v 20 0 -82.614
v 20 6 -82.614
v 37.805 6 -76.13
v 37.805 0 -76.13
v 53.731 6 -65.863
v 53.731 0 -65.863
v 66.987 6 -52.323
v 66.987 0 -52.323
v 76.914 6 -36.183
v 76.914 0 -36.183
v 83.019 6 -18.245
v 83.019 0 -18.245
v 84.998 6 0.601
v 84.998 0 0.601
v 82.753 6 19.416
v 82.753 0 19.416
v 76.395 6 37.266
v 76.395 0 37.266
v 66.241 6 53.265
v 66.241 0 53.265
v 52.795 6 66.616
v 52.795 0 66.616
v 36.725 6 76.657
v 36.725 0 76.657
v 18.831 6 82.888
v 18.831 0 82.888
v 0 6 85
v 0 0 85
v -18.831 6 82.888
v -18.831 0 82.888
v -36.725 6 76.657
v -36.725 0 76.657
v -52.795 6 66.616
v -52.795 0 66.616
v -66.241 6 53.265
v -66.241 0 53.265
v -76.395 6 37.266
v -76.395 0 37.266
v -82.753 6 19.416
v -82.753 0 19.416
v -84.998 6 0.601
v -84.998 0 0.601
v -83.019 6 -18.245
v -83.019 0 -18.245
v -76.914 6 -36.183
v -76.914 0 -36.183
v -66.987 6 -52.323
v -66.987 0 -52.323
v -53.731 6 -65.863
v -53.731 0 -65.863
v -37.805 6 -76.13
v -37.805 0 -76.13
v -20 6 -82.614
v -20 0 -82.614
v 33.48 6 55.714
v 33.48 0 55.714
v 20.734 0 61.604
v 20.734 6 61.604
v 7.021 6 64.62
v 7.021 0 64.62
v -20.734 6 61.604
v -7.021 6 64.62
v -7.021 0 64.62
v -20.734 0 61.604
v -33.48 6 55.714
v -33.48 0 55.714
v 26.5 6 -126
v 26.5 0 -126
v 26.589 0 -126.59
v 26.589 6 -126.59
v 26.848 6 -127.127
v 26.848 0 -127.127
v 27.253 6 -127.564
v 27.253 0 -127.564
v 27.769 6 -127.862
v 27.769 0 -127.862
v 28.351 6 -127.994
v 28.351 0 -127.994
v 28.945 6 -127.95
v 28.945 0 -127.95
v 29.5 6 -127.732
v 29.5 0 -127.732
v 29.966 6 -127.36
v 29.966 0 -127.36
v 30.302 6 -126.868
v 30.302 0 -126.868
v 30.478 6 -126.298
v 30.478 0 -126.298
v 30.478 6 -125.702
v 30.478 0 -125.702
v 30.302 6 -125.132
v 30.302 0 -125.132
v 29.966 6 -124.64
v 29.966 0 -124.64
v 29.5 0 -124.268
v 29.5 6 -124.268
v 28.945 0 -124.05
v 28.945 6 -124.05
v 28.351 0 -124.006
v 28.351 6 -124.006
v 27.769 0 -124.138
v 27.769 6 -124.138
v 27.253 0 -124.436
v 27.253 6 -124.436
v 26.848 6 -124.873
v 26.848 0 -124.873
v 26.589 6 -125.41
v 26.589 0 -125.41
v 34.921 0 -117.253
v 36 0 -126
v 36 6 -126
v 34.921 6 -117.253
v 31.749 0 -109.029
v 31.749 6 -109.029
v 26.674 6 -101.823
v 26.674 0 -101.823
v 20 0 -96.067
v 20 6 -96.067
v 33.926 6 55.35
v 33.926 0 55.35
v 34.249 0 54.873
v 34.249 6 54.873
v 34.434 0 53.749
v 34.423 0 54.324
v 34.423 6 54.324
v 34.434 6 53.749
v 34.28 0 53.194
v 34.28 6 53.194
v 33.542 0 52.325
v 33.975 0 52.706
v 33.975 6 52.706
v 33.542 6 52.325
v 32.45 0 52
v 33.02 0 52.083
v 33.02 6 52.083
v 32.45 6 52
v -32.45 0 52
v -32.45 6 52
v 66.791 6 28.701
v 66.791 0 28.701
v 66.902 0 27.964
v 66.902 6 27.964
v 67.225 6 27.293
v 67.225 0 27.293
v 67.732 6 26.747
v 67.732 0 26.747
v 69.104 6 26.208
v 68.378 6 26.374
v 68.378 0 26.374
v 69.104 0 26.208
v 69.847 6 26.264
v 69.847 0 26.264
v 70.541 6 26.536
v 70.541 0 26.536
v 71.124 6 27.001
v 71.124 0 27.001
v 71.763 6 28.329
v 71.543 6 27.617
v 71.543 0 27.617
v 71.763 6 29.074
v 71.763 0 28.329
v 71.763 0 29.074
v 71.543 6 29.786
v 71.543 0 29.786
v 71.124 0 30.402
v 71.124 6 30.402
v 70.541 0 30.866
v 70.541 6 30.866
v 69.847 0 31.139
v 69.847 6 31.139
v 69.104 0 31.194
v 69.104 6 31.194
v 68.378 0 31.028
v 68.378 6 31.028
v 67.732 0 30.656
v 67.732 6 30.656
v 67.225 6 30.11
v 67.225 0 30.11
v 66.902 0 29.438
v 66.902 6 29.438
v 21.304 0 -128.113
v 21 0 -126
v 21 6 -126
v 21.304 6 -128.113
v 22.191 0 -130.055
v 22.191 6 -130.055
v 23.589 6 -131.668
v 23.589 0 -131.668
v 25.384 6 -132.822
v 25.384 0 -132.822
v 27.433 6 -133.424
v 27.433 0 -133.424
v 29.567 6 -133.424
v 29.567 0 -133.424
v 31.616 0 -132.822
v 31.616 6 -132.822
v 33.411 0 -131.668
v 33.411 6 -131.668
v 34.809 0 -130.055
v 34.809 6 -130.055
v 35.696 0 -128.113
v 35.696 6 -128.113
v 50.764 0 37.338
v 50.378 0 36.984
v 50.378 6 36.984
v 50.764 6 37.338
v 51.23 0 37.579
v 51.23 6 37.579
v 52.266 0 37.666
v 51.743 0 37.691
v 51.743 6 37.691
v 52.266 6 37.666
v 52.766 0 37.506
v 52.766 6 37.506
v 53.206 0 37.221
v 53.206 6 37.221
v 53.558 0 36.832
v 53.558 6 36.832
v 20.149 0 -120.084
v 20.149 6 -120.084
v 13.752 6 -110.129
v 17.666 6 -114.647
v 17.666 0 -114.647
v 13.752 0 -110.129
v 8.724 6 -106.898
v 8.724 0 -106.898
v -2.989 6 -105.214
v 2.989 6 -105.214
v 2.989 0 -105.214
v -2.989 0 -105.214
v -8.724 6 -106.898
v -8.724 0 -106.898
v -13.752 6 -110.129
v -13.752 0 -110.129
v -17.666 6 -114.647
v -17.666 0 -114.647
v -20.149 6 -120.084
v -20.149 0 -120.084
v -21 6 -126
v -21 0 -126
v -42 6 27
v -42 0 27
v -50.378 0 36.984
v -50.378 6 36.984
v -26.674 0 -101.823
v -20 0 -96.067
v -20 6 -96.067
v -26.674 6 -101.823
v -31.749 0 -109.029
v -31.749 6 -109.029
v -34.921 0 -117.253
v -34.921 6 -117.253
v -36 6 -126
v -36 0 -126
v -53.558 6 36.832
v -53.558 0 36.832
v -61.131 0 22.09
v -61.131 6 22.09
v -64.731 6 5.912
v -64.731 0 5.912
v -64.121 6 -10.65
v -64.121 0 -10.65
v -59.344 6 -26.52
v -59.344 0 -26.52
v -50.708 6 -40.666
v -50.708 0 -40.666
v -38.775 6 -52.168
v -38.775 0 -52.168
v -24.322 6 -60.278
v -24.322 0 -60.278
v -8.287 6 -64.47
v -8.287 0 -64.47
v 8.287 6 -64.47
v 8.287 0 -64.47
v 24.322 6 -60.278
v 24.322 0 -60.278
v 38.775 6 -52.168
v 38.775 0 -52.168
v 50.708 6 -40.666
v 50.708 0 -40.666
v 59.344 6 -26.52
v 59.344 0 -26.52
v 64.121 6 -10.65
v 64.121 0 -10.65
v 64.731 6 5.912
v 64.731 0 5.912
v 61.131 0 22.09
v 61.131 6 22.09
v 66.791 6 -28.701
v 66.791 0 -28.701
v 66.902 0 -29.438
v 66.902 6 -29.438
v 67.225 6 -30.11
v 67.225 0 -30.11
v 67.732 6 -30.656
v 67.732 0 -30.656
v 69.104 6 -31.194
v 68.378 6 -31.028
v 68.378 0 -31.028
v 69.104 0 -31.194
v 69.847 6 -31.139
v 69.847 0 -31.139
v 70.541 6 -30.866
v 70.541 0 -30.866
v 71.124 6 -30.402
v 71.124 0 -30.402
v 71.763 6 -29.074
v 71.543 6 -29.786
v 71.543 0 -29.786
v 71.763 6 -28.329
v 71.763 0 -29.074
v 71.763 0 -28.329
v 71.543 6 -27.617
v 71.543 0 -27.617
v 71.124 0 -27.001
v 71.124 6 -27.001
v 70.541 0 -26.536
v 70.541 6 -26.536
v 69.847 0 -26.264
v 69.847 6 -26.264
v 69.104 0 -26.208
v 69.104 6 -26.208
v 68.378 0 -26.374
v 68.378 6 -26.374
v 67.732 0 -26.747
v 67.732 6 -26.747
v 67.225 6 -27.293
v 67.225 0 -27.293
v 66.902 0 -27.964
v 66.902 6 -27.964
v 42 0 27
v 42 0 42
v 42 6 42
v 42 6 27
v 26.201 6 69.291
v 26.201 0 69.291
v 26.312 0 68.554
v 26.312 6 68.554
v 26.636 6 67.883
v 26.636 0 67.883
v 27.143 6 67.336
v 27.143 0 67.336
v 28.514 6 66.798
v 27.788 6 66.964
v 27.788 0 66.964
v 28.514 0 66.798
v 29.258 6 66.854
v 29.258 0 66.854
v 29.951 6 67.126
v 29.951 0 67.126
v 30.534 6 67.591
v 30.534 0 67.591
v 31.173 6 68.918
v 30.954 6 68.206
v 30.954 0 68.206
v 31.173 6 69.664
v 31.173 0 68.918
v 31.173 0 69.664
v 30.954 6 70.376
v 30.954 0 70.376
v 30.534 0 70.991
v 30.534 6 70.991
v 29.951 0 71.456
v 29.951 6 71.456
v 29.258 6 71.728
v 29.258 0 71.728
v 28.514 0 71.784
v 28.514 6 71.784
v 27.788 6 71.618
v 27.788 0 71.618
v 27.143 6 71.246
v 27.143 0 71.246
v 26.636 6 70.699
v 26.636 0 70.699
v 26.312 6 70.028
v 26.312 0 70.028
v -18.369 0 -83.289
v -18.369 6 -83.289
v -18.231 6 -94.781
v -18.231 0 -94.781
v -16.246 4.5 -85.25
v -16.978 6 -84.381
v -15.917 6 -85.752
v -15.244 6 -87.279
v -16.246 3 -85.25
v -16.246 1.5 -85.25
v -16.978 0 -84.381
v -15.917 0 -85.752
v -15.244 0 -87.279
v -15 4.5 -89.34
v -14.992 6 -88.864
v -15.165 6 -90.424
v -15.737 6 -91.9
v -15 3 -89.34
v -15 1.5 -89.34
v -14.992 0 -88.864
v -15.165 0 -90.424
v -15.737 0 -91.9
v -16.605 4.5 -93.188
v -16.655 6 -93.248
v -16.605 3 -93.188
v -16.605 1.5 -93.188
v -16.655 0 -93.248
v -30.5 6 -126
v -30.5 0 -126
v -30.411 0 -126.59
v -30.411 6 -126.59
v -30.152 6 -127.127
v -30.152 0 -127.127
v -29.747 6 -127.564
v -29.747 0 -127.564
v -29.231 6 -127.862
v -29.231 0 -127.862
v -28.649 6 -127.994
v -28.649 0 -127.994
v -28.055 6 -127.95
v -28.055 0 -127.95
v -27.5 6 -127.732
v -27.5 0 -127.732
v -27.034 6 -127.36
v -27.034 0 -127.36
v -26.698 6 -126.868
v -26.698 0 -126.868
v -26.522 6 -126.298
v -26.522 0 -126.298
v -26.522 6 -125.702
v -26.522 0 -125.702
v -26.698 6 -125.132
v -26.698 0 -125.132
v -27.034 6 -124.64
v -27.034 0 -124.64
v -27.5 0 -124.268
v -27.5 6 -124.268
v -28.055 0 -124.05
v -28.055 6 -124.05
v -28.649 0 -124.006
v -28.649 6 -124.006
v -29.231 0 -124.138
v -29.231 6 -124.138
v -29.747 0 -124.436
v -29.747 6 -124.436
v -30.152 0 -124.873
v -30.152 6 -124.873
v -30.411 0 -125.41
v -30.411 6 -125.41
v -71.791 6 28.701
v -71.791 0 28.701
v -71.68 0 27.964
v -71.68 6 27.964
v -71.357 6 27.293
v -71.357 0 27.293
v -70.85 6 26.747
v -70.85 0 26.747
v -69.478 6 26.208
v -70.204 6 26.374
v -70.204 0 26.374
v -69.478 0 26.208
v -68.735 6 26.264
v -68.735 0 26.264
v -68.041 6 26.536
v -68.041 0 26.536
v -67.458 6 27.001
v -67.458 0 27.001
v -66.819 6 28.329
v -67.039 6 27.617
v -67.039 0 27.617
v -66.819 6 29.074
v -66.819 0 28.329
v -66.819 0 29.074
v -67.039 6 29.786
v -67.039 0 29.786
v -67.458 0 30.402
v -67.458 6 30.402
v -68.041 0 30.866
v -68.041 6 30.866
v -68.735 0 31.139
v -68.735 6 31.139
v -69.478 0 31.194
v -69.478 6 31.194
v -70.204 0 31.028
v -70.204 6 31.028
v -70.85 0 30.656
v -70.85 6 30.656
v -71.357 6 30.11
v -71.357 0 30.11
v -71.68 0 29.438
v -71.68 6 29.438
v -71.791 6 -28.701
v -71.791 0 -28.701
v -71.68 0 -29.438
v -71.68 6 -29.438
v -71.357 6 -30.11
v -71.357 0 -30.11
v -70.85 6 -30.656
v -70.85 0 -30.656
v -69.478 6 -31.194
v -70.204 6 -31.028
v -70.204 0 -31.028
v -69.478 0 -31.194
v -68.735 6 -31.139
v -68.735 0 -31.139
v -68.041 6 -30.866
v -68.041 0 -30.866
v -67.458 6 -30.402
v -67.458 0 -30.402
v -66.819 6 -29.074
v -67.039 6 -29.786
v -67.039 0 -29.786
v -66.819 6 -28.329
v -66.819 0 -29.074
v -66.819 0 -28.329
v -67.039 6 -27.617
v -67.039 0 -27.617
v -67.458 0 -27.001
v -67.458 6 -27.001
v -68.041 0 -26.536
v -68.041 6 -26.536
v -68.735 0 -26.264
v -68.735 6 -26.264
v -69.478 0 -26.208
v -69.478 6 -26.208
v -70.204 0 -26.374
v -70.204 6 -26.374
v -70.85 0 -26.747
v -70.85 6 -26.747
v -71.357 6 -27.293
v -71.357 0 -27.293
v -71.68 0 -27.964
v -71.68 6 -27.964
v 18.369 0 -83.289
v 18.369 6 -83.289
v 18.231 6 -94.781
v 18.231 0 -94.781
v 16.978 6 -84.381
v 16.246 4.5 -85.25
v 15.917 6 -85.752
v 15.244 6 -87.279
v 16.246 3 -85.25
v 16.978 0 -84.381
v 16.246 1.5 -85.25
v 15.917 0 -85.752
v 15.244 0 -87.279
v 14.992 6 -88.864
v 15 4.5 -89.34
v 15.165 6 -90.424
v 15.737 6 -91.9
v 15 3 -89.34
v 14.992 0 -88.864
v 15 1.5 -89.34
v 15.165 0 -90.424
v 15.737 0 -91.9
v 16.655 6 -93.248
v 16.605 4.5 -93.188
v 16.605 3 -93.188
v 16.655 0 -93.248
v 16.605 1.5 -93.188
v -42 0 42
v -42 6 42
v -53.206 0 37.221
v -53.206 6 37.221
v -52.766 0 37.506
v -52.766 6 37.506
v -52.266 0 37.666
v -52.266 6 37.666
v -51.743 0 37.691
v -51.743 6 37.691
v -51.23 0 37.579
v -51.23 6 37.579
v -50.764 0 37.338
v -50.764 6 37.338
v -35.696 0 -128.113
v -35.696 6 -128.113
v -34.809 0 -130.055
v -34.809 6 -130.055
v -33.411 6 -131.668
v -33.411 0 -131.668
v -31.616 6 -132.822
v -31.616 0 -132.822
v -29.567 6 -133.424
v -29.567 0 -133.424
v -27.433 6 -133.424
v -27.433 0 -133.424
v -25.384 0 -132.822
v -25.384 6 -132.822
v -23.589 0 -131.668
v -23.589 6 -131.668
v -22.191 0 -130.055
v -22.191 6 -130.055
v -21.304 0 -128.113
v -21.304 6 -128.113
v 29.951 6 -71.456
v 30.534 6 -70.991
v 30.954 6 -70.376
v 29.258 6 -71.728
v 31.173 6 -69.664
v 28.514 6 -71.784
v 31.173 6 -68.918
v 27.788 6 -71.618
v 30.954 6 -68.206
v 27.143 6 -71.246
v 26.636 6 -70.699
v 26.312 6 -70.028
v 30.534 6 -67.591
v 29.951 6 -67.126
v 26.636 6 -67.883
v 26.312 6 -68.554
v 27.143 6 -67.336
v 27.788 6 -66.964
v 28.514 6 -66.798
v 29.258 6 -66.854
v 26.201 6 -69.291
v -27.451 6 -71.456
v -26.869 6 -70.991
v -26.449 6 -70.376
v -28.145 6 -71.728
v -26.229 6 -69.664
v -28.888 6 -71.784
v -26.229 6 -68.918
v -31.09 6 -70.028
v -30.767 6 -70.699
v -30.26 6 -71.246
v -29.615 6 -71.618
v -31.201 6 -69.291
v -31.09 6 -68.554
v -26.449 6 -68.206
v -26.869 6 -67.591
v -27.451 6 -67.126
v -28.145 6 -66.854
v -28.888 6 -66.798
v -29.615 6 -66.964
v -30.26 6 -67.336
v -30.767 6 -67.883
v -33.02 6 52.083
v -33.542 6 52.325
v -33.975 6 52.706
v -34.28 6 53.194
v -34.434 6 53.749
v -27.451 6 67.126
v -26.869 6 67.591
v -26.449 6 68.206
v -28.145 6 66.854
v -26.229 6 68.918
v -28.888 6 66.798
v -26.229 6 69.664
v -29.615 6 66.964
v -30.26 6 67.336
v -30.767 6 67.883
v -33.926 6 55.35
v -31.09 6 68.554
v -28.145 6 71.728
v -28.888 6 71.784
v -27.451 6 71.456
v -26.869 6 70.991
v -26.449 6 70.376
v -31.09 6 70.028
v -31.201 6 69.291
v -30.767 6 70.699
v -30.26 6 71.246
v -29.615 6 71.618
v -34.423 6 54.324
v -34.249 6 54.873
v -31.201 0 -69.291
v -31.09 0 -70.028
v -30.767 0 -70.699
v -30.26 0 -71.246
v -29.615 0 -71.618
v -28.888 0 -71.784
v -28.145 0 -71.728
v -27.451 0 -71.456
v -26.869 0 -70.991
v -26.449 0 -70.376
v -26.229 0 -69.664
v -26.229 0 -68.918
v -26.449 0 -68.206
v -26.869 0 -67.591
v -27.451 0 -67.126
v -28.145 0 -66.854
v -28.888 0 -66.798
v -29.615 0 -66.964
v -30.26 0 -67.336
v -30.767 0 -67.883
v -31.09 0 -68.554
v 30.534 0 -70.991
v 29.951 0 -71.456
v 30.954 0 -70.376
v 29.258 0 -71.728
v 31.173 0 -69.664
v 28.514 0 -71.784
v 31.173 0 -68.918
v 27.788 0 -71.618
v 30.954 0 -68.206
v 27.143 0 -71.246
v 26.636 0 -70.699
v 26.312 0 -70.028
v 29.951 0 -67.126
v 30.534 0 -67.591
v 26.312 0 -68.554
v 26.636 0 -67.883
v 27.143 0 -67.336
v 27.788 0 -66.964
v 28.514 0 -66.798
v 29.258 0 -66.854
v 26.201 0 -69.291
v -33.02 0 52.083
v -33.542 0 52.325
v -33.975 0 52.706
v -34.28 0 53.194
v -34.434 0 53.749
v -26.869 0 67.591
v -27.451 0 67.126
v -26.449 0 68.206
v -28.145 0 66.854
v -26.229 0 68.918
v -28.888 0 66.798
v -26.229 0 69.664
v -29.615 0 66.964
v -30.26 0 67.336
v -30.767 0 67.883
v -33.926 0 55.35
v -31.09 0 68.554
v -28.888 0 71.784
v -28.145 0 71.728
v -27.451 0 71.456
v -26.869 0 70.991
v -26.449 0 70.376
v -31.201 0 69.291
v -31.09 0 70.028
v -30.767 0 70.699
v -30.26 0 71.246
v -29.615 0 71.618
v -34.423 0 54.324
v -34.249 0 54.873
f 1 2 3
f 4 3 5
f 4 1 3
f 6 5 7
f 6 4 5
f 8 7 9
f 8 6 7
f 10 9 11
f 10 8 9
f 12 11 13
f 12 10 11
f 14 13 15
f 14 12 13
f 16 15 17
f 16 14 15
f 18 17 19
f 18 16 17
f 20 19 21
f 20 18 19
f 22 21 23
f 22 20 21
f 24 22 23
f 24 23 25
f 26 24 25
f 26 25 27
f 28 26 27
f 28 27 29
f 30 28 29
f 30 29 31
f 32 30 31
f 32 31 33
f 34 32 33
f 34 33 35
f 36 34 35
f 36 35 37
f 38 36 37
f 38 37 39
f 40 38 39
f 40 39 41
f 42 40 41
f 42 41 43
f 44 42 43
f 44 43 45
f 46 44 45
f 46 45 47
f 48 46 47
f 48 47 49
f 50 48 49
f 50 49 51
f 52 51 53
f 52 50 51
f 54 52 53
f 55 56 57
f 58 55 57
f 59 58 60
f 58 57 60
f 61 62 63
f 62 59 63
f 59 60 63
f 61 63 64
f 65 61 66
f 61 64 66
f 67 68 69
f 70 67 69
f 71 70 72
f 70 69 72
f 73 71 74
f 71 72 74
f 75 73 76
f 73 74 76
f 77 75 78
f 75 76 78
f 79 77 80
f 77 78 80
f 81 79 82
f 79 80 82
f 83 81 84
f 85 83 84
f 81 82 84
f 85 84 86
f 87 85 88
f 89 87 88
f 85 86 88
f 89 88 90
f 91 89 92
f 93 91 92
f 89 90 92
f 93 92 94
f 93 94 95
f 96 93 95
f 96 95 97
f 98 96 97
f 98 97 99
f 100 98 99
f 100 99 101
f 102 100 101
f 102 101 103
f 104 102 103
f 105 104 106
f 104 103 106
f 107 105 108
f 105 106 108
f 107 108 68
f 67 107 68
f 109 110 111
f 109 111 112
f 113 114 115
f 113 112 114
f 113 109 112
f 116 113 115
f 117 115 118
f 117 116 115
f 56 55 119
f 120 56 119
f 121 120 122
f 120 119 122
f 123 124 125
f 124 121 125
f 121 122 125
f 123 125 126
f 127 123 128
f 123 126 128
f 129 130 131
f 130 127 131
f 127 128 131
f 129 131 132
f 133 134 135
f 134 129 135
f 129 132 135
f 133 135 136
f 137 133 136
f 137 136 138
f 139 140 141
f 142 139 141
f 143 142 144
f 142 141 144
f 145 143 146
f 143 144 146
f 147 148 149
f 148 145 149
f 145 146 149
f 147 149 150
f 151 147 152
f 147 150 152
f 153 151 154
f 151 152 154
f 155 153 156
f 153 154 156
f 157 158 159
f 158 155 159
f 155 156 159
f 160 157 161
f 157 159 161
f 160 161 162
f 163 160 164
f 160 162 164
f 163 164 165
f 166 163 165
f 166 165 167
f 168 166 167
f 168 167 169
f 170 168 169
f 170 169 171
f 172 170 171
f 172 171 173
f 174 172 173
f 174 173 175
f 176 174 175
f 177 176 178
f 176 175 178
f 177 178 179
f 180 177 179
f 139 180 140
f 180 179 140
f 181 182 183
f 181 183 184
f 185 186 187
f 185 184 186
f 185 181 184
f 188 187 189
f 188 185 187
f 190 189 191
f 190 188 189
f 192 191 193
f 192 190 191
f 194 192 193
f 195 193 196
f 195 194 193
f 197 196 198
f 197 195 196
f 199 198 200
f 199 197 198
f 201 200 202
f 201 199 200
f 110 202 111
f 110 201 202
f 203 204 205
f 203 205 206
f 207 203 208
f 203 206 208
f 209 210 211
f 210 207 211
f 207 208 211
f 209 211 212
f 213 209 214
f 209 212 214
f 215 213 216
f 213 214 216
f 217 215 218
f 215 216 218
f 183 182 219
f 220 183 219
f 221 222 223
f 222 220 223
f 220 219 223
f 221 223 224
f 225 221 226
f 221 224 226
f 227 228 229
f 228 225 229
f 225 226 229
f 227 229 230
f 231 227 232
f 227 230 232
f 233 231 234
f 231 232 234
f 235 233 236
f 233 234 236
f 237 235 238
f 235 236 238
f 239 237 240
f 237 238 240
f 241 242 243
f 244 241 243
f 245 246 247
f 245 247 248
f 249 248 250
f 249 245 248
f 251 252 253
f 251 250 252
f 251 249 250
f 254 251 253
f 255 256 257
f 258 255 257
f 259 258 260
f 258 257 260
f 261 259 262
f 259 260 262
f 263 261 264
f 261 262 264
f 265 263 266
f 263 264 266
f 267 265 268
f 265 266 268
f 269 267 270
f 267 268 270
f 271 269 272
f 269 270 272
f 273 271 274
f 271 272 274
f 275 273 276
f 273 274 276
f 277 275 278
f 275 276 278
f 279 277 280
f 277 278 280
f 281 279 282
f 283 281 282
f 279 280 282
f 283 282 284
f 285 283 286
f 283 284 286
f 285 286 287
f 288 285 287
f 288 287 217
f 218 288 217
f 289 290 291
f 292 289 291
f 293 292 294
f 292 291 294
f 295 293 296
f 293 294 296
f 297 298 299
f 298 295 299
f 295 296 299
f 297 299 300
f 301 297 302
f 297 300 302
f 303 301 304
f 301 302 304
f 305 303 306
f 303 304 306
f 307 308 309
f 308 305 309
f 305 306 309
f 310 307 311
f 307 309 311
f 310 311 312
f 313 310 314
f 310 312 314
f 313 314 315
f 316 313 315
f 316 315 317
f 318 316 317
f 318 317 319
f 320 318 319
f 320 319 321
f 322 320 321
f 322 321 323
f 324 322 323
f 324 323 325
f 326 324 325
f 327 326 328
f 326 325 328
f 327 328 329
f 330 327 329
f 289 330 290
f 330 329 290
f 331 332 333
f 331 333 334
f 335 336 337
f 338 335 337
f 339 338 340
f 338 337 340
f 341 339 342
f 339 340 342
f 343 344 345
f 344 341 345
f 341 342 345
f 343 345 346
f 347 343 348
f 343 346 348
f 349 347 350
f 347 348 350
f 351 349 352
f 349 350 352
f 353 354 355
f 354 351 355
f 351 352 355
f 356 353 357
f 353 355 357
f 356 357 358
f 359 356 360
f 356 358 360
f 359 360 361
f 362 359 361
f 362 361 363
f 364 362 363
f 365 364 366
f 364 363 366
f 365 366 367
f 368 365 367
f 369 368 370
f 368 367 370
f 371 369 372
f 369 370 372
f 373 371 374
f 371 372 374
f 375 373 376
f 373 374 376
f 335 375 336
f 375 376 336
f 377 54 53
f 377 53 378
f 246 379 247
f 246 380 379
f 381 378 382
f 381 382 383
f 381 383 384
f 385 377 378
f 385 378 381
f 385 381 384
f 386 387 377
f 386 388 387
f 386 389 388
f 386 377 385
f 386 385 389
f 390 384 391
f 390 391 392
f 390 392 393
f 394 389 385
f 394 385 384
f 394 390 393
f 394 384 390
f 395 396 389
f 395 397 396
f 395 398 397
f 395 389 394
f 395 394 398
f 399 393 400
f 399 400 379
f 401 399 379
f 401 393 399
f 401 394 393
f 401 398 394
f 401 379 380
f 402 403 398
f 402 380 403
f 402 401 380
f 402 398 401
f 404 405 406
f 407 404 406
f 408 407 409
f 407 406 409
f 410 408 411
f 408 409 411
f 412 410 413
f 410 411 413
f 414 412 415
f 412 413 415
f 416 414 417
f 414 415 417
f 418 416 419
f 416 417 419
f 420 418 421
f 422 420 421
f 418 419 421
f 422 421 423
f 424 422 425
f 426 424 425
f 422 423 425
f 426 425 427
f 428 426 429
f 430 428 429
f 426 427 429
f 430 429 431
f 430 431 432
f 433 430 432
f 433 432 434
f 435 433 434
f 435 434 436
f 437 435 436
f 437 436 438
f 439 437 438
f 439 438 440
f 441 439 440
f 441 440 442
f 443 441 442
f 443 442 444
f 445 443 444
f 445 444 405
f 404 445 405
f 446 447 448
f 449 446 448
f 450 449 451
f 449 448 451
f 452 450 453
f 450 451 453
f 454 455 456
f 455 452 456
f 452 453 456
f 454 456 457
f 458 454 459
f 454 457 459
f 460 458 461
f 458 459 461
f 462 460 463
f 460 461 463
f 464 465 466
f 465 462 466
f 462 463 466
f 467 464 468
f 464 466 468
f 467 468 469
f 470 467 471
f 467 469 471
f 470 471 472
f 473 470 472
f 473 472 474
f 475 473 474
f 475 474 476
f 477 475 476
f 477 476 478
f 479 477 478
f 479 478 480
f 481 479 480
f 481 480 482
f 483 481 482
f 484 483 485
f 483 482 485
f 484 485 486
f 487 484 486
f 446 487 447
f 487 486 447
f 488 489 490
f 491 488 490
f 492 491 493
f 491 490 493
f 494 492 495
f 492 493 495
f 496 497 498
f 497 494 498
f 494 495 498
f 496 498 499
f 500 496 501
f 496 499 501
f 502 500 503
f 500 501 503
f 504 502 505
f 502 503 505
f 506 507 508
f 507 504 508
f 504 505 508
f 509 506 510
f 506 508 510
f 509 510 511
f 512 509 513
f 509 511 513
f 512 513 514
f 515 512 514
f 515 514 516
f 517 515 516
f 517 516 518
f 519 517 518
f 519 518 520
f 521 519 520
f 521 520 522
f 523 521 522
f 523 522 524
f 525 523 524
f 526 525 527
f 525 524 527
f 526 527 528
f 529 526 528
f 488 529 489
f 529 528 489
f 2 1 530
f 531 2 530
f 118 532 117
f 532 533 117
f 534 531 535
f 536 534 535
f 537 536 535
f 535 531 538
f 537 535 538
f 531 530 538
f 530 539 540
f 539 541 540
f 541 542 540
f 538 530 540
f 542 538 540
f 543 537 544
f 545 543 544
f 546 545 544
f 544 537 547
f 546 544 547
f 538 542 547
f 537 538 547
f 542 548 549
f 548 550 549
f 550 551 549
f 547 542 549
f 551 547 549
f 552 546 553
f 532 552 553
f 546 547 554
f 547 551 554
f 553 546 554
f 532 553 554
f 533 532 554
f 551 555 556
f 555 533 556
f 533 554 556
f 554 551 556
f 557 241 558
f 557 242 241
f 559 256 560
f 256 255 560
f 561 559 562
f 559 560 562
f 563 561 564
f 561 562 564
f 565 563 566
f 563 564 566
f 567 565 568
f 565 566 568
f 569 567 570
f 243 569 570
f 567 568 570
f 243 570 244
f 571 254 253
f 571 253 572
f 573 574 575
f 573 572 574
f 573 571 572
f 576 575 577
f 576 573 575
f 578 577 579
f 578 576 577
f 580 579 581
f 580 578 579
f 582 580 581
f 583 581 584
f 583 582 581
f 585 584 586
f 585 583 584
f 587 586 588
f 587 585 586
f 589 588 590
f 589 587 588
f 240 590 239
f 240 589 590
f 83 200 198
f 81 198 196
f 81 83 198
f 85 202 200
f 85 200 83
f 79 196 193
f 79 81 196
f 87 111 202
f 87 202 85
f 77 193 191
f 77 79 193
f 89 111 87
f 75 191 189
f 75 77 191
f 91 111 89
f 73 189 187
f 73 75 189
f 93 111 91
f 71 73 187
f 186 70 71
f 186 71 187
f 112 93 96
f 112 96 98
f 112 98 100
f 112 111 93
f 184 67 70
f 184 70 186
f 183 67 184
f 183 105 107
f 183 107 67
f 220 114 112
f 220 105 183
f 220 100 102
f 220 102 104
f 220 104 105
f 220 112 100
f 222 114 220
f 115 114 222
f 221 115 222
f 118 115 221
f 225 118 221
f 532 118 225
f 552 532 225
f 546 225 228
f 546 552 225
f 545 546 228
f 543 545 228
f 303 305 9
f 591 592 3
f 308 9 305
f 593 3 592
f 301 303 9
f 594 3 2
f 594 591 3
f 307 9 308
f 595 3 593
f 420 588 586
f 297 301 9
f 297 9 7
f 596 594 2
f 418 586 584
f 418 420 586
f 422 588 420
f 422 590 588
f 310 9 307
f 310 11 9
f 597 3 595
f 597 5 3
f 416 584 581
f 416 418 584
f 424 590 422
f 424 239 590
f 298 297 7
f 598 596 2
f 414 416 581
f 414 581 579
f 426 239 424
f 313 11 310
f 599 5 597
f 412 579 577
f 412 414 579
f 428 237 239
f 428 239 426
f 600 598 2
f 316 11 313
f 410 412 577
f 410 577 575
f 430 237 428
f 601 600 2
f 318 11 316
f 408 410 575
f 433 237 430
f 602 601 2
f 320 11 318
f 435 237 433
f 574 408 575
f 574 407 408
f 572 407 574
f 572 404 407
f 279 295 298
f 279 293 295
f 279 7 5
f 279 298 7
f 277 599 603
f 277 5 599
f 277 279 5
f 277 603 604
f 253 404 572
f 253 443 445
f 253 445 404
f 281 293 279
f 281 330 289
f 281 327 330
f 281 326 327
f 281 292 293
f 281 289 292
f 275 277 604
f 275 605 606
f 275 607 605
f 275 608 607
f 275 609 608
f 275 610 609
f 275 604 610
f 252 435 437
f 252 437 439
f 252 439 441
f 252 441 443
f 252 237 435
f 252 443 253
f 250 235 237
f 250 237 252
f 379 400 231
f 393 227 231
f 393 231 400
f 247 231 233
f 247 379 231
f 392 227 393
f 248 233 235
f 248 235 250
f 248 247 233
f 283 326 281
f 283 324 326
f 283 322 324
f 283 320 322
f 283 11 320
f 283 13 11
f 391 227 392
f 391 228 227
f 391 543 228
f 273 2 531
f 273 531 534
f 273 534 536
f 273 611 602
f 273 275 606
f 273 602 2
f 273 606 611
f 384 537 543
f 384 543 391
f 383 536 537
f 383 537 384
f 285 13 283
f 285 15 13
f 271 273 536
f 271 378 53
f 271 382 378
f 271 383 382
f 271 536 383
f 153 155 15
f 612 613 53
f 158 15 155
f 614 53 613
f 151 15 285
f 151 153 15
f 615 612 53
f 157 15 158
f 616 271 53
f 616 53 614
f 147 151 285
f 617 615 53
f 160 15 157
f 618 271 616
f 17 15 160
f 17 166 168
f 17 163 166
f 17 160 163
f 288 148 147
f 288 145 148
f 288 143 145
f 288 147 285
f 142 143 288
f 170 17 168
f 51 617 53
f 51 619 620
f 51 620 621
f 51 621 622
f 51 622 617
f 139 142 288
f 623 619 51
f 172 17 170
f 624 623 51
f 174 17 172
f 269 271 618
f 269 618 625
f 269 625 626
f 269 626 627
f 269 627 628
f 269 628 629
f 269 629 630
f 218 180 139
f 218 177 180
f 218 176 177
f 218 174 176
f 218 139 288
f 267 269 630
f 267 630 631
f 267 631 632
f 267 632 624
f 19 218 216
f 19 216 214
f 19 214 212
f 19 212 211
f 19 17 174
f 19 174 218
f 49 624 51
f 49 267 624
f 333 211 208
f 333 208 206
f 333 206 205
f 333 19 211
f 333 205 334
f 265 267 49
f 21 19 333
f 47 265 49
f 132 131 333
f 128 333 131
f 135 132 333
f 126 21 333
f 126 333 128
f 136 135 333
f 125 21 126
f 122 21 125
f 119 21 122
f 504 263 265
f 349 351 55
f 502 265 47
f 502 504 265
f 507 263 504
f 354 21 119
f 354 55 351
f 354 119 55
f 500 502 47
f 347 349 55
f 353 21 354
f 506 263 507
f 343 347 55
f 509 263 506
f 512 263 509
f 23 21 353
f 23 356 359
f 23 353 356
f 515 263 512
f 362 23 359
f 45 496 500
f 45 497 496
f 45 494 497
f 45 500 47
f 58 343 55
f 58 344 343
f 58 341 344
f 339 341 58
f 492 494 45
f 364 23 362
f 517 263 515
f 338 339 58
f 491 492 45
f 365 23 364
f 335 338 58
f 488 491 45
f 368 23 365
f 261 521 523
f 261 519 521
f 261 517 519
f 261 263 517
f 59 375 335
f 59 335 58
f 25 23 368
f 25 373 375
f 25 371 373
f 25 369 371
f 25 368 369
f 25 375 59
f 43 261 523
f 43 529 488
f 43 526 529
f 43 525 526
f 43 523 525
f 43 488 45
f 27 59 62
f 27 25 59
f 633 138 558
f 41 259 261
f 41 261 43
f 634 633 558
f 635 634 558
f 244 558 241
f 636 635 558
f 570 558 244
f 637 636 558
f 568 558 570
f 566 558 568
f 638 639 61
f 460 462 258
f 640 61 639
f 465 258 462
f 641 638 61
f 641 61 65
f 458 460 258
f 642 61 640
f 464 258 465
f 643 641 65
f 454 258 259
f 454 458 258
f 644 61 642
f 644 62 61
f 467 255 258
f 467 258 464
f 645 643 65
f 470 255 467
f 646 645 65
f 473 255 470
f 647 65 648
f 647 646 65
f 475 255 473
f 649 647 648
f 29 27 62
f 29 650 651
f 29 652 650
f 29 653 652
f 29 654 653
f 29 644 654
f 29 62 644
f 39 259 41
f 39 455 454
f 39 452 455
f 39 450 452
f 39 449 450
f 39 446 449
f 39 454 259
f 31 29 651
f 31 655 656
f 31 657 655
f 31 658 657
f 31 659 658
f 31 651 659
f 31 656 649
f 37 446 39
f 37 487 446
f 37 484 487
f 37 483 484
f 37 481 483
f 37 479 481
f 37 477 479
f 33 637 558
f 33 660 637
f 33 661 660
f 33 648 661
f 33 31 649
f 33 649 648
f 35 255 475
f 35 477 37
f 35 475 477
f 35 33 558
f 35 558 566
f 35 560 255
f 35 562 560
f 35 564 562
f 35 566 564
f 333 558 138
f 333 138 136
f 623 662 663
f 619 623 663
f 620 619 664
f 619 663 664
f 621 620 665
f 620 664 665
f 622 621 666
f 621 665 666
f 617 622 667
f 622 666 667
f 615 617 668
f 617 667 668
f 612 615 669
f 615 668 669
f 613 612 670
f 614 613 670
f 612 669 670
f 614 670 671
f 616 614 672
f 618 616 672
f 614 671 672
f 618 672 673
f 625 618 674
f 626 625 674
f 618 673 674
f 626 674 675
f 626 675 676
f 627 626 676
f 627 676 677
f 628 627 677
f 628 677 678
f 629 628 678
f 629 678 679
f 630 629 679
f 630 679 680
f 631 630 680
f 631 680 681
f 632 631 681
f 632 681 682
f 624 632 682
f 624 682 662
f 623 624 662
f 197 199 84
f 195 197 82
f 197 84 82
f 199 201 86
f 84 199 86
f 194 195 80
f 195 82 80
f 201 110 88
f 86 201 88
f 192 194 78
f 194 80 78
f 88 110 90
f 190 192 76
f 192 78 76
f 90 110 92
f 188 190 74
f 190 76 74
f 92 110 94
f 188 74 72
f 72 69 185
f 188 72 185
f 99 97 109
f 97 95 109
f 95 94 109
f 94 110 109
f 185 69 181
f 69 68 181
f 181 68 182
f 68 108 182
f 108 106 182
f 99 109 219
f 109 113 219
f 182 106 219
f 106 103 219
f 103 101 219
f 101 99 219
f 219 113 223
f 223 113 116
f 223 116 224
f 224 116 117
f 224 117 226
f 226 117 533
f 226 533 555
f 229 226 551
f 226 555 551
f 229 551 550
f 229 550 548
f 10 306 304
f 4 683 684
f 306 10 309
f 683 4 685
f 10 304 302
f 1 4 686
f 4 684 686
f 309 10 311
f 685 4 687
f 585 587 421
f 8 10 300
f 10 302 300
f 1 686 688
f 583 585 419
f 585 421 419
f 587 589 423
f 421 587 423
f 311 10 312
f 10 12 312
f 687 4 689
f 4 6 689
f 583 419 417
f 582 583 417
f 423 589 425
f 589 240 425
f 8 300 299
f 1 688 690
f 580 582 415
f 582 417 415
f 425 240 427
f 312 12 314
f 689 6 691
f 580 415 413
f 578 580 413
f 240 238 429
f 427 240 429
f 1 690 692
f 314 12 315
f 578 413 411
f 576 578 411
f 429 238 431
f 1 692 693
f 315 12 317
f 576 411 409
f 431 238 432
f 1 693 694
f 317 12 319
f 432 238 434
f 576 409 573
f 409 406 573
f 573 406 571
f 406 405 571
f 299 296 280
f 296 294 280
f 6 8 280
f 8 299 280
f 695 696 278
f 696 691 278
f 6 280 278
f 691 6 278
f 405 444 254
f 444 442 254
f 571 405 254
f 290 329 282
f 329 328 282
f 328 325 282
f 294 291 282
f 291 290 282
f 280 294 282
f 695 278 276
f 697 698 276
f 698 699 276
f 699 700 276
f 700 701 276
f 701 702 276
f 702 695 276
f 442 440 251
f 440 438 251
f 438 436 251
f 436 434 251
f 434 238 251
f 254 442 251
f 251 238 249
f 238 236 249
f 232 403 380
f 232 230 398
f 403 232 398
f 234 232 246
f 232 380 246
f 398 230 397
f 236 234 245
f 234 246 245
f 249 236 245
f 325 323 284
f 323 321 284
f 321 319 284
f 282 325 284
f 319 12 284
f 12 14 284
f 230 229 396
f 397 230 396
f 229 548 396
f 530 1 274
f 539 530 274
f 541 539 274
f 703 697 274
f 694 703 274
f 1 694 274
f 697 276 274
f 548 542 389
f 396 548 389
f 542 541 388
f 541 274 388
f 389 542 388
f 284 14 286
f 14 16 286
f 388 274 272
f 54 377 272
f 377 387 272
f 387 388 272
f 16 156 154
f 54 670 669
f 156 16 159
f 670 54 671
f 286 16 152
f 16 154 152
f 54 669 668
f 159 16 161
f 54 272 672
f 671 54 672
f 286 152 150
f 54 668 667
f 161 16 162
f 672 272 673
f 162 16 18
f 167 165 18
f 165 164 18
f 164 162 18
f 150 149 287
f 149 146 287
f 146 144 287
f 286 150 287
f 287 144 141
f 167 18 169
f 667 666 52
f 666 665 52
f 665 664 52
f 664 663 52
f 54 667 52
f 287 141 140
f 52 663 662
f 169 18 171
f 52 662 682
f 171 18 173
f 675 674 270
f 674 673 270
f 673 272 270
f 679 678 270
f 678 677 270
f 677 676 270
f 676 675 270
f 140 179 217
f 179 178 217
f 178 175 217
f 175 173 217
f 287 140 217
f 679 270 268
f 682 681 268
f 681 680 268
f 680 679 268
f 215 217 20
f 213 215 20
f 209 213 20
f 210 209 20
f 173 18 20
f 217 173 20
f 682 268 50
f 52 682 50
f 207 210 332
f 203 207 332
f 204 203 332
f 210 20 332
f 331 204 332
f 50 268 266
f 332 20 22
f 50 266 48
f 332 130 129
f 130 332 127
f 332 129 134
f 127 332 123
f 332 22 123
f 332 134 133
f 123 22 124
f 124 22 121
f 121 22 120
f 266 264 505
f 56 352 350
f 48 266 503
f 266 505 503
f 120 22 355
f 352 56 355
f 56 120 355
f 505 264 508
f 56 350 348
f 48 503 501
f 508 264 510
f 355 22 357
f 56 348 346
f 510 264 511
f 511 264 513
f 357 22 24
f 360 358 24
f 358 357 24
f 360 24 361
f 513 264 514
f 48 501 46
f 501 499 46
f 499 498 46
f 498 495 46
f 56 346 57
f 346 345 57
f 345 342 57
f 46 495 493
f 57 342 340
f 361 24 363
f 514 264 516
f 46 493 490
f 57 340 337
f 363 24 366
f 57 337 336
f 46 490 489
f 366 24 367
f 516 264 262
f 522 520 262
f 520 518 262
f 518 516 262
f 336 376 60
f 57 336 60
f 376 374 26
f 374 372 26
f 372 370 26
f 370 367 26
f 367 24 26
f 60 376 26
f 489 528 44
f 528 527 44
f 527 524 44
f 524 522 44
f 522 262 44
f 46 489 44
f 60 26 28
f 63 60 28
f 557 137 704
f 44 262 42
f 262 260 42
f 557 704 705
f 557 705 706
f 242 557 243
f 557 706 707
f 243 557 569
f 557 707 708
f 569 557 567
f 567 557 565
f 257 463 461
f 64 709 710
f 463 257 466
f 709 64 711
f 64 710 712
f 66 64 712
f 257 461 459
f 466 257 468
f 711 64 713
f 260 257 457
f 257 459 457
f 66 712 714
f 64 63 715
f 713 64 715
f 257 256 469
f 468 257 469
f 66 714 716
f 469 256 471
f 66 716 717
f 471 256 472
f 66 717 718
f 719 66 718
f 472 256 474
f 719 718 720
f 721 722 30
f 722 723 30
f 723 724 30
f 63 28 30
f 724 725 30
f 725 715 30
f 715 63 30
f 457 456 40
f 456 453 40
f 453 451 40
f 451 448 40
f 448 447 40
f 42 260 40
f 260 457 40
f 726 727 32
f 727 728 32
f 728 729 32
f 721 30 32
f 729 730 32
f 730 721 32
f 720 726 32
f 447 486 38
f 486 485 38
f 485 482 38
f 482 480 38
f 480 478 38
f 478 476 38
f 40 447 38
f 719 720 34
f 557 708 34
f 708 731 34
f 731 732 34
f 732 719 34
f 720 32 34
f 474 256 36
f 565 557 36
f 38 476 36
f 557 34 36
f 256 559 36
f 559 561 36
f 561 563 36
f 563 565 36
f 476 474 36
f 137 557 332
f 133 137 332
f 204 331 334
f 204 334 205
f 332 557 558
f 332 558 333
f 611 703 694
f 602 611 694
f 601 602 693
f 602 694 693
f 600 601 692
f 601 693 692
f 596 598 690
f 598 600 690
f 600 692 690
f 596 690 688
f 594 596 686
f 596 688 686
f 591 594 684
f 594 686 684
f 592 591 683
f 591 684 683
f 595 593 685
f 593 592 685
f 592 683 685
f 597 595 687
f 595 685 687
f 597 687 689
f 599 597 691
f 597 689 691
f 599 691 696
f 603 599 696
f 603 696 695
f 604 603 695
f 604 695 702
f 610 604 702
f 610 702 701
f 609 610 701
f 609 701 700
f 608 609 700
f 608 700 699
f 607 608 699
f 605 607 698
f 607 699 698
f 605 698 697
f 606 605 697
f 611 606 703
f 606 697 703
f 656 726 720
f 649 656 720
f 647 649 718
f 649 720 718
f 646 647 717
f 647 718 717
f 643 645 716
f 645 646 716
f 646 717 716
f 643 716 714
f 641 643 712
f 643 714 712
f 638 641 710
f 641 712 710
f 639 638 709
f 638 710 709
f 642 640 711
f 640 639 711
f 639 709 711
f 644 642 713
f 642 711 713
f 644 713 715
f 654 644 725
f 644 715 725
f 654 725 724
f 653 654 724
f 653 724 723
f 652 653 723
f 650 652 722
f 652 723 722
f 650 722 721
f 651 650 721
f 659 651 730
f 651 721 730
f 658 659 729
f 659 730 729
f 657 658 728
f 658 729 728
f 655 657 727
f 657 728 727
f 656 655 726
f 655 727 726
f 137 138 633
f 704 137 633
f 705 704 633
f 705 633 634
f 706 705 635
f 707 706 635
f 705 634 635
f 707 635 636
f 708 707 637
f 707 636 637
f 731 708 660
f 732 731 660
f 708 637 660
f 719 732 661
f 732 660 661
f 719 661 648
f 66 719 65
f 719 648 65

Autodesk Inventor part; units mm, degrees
ref_plane "YZ Plane" through (0, 0, 0) normal (1, 0, 0) x (0, 1, 0)
ref_plane "XZ Plane" through (0, 0, 0) normal (0, 1, 0) x (-1, 0, 0)
ref_plane "XY Plane" through (0, 0, 0) normal (0, 0, 1) x (1, 0, 0)
sketch "Sketch1" plane through (0, 0, 0) normal (0, 1, 0) x (-1, 0, 0)
  arc A0 (20, -82.6136) -> (-20, -82.6136) centre (0, 0) ccw
  line L0 (0, 0) -> (0, -85)
  line L1 (0, 0) -> (32.5281, -78.5298)
  circle A1 centre (0, 0) radius 75 construction
  circle A2 centre (28.7013, -69.291) radius 2.5
  line L2 (41, -41) -> (-41, -41) construction
  line L3 (-41, -41) -> (-41, 41) construction
  line L4 (-41, 41) -> (41, 41) construction
  line L5 (41, 41) -> (41, -41) construction
  line L6 (0, 0) -> (-85, 0)
  circle A3 centre (69.291, -28.7013) radius 2.5
  circle A4 centre (69.291, 28.7013) radius 2.5
  circle A5 centre (28.7013, 69.291) radius 2.5
  circle A6 centre (-28.7013, 69.291) radius 2.5
  circle A7 centre (-69.291, 28.7013) radius 2.5
  circle A8 centre (-69.291, -28.7013) radius 2.5
  circle A9 centre (-28.7013, -69.291) radius 2.5
  line L7 (42, 27) -> (42, 42)
  line L8 (42, 42) -> (-42, 42)
  line L9 (-42, 42) -> (-42, 27)
  line L10 (42, 27) -> (52.0326, 38.9564)
  line L11 (-39, 52) -> (39, 52)
  line L12 (-42, 27) -> (-52.0326, 38.9564)
  arc A10 (-52.0326, 38.9564) -> (52.0326, 38.9564) centre (0, 0) ccw
  arc A11 (39, 52) -> (-39, 52) centre (0, 0) ccw
  arc A12 (21, -126) -> (-21, -126) centre (0, -126) ccw
  line L13 (0, -105) -> (0, -85) construction
  arc A13 (-20, -82.6136) -> (20, -82.6136) centre (0, 0) ccw construction
  line L14 (0, -126) -> (36, -126) construction
  arc A14 (27.5132, -133.4348) -> (-27.5132, -133.4348) centre (0, -126) ccw
  circle A15 centre (28.5, -126) radius 2
  circle A16 centre (-28.5, -126) radius 2
  arc A17 (-20, -96.0667) -> (-36, -126) centre (0, -126) ccw
  arc A18 (36, -126) -> (20, -96.0667) centre (0, -126) ccw
  arc A19 (21, -126) -> (36, -126) centre (28.5, -126) ccw
  line L15 (0, -126) -> (-36, -126) construction
  arc A20 (-36, -126) -> (-21, -126) centre (-28.5, -126) ccw
  line L16 (-20, -89.3401) -> (-15, -89.3401) construction
  spline S0 degree 4 poles (-20, -82.6136) (-15.4558, -83.7137) (-12.0866, -90.2039) (-16.4143, -93.671) (-20, -96.0667) knots 0 0 0 0 0 1 1 1 1 1
  spline S1 degree 4 poles (20, -82.6136) (15.4558, -83.7137) (12.0866, -90.2039) (16.4143, -93.671) (20, -96.0667) knots 0 0 0 0 0 1 1 1 1 1
  line L17 (20, -89.3401) -> (15, -89.3401) construction
  line L18 (20, -96.0667) -> (20, -82.6136) construction
  line L19 (-20, -96.0667) -> (-20, -82.6136) construction
  point P0 (0, -41)
  point P1 (-41, 0)
  point P2 (0, 52)
  point P3 (17.5, -89.3401)
  dimension "d4" = 150
  dimension "d0" = 170
  dimension "d3" = 22.5
  dimension "d6" = 82
  dimension "d10" = 360
  dimension "d12" = 5
  dimension "d13" = 1
  dimension "d14" = 1
  dimension "d15" = 1
  dimension "d16" = 15
  dimension "d17" = 40
  dimension "d18" = 10
  dimension "d19" = 40
  dimension "d20" = 20
  dimension "d21" = 42
  dimension "d25" = 20
  dimension "d28" = 57
  dimension "d32" = 360
  dimension "d34" = 4
  dimension "d37" = 15
  dimension "d41" = 5
  dimension "d42" = 6.7266
  dimension "d43" = 6.7266
  dimension "d44" = 30
extrude "Extrusion1" add sketch "Sketch1" along normal blind 6 contours S1 A18 A19 A14 A15 A16 A20 A17 S0 A0 L6 A10 L1 A2 | L1 A2 A10 L10 L7 L8 L9 L12 L6 A0 | A19 A12 A20 A14 A16 A15
sketch "Sketch2" plane through (0, 6, 0) normal (0, 1, 0) x (1, 0, 0)
  point P0 (0, 0)
fillet "Fillet1" radius 2 4 edges at (-39, 3, 52) (39, 3, 52) (-52.0326, 3, 38.9564) (52.0326, 3, 38.9564)
equation "\"d14\" = d13"
equation "\"d15\" = d13"
equation "\"d19\" = d17"
properties part number "SparRing Curved" material "Plywood, Finish"
